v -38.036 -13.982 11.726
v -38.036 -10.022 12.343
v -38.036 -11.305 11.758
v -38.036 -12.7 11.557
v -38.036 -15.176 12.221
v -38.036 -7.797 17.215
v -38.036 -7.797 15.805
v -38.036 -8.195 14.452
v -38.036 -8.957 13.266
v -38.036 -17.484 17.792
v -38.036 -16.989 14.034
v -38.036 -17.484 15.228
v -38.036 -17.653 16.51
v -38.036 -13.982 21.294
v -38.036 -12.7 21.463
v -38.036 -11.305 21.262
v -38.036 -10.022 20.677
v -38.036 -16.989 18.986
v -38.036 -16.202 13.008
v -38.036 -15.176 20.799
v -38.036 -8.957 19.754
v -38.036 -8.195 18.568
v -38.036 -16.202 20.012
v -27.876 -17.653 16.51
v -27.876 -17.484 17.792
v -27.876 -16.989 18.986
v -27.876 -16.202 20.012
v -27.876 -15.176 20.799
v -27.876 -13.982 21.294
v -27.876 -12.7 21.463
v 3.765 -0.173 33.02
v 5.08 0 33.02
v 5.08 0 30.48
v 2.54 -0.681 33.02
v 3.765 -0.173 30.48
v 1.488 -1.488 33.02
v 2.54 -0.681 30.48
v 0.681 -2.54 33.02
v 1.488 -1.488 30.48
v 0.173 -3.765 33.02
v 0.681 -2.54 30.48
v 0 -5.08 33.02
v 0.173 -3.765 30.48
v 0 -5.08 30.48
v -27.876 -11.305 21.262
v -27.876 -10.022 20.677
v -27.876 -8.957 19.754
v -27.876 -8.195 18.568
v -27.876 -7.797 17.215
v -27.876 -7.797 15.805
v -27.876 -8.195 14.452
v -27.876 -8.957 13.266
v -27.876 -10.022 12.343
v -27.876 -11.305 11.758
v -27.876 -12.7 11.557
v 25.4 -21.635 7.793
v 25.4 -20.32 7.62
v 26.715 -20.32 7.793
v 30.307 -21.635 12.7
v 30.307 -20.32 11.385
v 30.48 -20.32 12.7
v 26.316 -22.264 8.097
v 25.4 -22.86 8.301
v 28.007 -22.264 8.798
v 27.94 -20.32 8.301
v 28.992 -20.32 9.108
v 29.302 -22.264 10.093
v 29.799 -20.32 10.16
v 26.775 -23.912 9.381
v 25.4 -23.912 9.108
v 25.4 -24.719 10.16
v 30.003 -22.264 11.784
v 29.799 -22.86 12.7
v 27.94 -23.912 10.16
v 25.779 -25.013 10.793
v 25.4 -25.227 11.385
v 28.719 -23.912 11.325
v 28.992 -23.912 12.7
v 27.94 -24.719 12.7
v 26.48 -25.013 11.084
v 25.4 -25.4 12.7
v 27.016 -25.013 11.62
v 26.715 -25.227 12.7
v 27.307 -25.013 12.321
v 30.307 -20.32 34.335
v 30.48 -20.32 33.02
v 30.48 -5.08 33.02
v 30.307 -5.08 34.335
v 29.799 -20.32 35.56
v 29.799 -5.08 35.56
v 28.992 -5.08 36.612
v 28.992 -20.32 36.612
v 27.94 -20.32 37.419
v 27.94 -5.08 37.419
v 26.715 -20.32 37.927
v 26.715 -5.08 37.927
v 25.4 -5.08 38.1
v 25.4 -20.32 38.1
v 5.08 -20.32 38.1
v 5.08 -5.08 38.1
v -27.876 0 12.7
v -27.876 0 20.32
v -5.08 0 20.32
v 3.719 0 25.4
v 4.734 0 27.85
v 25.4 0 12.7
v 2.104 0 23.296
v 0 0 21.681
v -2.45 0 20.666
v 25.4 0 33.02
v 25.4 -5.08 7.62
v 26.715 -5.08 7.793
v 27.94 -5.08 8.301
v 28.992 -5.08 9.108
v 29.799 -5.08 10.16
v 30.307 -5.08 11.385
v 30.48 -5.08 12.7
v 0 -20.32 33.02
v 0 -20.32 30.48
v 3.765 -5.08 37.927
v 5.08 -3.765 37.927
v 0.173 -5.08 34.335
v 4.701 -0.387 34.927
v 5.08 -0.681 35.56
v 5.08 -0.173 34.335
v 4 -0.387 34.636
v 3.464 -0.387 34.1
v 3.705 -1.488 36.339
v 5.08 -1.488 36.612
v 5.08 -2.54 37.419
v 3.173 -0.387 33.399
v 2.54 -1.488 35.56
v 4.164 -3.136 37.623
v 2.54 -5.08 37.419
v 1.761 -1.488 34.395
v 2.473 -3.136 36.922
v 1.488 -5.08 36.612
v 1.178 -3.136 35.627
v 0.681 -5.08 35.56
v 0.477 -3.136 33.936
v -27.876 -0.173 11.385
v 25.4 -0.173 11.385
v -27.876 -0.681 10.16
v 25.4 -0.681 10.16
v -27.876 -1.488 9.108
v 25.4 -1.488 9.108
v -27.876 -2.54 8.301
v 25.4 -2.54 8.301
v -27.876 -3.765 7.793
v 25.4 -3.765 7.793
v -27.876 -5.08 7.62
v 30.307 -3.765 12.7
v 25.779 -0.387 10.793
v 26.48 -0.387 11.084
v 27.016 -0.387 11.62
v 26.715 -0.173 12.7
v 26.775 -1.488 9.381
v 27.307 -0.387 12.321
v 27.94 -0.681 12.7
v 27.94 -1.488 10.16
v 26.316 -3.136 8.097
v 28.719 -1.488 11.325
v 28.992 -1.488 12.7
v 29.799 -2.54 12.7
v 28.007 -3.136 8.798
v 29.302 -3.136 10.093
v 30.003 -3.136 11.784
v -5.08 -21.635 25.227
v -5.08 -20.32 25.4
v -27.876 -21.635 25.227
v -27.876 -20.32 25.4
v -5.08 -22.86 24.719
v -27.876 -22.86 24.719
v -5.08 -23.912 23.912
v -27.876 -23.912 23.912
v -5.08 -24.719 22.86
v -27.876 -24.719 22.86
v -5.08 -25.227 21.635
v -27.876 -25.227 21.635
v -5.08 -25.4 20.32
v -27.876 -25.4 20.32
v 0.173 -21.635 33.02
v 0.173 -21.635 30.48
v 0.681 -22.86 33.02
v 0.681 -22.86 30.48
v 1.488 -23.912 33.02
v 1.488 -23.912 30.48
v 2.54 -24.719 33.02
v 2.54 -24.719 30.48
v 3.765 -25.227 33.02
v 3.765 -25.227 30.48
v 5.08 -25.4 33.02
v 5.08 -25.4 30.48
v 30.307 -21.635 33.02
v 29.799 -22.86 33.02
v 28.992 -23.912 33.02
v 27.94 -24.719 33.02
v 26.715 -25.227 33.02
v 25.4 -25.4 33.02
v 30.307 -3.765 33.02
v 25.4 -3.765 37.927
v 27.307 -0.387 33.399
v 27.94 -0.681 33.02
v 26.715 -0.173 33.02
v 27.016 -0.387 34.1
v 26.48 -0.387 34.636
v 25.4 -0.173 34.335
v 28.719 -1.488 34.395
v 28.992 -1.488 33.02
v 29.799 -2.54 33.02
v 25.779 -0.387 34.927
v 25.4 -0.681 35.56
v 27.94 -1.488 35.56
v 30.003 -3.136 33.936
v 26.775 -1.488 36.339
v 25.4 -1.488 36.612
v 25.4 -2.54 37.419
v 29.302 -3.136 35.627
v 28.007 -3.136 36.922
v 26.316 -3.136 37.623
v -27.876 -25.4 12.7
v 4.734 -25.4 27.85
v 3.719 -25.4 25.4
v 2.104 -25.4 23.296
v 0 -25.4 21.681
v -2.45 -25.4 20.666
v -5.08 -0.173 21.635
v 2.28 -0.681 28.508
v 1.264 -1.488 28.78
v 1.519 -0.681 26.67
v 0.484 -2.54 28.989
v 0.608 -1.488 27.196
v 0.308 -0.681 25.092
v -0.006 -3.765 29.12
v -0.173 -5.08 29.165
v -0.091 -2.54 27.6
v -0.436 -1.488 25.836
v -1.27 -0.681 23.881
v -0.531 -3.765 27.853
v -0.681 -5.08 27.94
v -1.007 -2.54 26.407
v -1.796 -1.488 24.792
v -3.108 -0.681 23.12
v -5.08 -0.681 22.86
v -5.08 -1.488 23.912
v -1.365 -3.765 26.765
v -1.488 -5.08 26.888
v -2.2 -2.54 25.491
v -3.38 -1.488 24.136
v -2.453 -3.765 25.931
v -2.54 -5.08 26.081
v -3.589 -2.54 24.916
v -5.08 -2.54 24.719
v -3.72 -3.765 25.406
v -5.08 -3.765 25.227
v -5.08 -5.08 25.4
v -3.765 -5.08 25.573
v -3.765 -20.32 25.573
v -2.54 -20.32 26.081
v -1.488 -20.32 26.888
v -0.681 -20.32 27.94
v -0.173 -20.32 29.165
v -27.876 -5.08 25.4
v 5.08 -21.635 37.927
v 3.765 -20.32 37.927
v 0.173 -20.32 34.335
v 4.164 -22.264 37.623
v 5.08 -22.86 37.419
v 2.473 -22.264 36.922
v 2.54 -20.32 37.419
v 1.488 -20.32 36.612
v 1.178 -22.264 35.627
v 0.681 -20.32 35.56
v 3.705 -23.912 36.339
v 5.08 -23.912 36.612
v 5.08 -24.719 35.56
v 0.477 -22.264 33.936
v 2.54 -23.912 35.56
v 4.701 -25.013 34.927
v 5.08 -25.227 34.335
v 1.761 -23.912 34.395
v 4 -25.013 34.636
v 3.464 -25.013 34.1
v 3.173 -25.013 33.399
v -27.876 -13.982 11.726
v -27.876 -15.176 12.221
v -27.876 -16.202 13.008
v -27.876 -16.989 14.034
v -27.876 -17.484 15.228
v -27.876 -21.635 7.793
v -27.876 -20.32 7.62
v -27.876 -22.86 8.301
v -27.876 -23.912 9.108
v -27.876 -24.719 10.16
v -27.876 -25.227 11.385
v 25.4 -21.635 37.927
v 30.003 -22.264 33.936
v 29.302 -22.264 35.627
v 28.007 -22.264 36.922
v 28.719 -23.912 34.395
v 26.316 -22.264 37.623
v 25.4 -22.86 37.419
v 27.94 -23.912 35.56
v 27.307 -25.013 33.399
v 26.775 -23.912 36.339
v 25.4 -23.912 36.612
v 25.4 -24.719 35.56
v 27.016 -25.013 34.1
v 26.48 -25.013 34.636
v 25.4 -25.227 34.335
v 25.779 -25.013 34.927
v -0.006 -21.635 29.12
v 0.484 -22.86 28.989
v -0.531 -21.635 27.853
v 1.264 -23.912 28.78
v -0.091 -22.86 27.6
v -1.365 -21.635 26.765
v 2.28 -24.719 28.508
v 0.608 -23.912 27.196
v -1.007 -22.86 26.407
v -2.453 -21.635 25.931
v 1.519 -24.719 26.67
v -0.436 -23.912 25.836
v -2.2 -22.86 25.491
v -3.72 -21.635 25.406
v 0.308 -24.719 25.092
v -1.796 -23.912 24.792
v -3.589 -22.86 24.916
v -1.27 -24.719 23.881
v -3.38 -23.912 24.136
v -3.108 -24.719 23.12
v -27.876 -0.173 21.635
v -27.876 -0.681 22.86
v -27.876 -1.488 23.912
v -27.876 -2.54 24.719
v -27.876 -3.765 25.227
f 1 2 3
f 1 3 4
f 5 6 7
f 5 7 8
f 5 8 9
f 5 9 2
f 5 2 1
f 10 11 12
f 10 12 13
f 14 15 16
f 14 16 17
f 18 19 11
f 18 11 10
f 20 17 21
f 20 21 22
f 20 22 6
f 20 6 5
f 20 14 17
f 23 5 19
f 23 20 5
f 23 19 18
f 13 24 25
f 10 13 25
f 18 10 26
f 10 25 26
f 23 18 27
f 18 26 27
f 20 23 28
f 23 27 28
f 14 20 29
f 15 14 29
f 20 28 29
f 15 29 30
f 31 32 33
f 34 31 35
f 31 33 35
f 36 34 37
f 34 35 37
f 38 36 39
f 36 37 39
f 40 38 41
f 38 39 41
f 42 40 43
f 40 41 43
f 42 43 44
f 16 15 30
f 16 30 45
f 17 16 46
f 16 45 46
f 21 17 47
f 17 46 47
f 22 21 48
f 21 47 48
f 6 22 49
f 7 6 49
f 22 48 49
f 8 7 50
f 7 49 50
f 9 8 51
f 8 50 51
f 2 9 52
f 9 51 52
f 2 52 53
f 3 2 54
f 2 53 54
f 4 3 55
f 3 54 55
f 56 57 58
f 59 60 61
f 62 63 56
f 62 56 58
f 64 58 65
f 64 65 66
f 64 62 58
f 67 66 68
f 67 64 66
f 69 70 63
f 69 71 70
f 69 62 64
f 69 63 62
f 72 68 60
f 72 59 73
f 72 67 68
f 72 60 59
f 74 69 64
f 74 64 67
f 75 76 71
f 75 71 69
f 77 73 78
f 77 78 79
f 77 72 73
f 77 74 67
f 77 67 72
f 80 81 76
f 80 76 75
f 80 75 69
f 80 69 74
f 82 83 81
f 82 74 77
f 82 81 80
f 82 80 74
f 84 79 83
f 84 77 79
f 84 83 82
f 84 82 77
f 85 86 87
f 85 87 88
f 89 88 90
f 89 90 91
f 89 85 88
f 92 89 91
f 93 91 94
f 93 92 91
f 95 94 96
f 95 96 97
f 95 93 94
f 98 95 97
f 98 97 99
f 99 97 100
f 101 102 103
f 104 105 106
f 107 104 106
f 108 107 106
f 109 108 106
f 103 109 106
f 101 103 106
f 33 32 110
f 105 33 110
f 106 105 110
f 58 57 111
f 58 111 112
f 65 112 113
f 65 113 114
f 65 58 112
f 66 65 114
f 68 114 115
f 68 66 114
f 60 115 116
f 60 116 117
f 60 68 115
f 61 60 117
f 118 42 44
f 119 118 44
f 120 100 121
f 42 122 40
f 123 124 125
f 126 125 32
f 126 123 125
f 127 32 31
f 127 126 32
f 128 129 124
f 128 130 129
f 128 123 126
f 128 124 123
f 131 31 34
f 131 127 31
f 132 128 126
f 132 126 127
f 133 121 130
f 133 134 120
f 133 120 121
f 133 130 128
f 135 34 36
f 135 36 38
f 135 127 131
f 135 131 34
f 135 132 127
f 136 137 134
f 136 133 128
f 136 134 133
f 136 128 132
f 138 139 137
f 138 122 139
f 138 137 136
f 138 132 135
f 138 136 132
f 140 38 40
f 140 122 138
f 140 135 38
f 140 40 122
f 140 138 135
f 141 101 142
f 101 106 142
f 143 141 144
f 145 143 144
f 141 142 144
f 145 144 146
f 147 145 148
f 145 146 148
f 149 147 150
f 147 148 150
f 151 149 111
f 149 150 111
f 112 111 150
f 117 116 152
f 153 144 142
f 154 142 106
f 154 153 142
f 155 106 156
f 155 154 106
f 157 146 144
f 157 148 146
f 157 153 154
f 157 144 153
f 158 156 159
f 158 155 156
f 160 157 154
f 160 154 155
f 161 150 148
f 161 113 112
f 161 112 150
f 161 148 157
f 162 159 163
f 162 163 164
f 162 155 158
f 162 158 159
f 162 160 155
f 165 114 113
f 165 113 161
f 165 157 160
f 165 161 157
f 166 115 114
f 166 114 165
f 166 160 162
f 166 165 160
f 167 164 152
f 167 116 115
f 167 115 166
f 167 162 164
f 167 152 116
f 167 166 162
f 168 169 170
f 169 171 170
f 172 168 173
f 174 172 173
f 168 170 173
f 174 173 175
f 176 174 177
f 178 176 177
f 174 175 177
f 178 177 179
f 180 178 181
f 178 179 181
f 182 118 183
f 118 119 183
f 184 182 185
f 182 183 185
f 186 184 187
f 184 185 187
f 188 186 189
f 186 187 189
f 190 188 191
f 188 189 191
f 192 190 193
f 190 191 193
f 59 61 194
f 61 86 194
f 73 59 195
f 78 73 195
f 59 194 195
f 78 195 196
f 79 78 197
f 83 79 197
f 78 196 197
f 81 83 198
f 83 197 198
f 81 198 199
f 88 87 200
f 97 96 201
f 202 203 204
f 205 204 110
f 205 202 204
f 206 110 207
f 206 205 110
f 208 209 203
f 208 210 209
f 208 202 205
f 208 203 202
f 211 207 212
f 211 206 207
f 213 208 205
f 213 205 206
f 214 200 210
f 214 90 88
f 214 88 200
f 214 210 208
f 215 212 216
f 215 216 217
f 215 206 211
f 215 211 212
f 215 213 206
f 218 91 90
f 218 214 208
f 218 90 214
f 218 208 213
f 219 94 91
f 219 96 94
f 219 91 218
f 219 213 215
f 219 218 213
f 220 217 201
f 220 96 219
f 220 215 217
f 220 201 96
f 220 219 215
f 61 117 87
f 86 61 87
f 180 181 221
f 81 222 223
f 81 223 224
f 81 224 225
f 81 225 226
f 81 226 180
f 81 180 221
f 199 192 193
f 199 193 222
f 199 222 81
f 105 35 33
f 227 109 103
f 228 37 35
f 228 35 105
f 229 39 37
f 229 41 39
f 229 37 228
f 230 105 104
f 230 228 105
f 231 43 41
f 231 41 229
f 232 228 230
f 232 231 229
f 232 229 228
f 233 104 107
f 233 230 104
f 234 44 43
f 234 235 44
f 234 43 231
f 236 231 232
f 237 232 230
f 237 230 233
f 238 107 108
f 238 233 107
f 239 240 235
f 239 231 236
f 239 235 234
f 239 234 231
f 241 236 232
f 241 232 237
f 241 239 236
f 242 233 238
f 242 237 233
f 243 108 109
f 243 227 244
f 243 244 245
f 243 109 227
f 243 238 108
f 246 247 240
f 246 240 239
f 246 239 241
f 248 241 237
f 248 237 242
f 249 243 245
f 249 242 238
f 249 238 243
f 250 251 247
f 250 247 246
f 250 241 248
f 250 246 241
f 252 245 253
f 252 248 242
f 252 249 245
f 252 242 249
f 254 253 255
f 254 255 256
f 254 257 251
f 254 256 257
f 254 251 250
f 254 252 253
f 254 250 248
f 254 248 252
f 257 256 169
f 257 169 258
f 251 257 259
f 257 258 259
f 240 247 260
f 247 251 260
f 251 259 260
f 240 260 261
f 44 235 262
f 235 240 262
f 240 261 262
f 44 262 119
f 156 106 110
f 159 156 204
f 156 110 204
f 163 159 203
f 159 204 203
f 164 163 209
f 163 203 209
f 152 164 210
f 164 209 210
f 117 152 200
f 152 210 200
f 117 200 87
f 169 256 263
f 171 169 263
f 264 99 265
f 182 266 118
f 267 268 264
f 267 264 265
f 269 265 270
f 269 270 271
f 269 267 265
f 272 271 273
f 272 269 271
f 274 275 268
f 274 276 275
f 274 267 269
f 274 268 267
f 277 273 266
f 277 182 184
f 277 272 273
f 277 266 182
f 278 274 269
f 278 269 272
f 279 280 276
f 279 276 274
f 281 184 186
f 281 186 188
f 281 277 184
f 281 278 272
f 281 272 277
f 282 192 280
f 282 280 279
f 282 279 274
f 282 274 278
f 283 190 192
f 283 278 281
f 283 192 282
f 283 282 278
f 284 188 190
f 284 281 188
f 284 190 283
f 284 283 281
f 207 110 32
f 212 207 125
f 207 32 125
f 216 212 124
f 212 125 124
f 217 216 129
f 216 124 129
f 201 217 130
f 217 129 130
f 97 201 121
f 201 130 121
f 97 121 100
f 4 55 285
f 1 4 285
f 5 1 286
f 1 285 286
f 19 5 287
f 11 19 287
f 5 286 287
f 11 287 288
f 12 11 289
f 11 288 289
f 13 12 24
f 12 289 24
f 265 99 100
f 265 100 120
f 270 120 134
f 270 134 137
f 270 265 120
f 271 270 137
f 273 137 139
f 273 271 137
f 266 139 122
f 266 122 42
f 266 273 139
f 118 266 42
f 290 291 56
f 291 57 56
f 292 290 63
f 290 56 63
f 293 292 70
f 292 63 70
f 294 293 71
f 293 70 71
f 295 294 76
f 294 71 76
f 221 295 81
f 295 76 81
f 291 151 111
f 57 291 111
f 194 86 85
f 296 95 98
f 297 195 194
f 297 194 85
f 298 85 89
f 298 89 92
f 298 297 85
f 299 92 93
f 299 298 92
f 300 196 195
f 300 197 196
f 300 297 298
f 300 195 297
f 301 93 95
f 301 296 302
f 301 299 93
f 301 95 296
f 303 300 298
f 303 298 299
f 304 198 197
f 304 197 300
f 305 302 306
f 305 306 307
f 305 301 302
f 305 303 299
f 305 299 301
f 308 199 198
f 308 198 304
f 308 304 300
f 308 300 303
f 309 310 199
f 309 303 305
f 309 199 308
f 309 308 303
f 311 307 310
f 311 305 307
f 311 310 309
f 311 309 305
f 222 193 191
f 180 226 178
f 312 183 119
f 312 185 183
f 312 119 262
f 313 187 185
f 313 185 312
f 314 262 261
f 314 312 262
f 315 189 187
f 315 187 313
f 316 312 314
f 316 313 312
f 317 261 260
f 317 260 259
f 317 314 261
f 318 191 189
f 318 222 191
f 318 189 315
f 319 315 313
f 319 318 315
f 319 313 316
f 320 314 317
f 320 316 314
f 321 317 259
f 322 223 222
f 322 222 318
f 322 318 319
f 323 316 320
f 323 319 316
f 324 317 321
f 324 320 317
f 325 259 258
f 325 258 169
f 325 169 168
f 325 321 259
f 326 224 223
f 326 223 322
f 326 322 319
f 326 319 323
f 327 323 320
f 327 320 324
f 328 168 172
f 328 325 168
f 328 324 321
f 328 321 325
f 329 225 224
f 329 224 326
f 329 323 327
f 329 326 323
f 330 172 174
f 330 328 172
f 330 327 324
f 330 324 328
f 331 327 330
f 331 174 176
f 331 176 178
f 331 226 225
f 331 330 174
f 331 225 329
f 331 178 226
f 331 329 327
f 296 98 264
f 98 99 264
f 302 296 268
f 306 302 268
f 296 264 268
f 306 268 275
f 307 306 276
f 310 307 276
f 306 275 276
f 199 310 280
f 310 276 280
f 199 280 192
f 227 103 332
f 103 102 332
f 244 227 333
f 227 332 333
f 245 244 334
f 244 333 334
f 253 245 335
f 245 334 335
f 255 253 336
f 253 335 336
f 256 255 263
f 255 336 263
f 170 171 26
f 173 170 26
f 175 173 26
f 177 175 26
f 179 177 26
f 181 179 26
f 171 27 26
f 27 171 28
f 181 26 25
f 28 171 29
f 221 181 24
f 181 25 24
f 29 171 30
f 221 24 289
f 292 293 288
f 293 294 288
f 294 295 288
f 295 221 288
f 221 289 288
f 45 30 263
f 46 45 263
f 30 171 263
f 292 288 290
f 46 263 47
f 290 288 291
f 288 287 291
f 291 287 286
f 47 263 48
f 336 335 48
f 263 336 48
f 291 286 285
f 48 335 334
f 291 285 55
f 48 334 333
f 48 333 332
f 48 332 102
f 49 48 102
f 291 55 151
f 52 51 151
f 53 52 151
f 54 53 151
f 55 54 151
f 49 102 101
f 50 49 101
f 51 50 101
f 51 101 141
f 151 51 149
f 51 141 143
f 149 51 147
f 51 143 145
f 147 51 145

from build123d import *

# Parameters (mm, degrees)
F1_DEPTH = 25.4
F2_R     = 5.08
F3_R     = 5.08
F5_DEPTH = 10.16


with BuildPart() as f1:
    # F0 (on Front) → F1 (new body)
    with BuildSketch(Plane.XZ):
        Polygon((0, 38.0835495889), (0, 25.4), (-25.4, 25.4), (-27.8758880853, 25.4), (-27.8758880853, 7.62), (30.48, 7.62), (30.48, 38.1), (0, 38.1), align=None)
    extrude(amount=F1_DEPTH)

    # F2
    f2_edges = [f1.edges().sort_by_distance(p)[0] for p in [
        (0, -12.7, 25.4),
        (0, -12.7, 38.1),
        (30.48, -12.7, 38.1),
        (30.48, -12.7, 7.62),
    ]]
    fillet(f2_edges, radius=F2_R)

    # F3
    f3_edges = [f1.edges().sort_by_distance(p)[0] for p in [
        (30.48, 0, 22.86),
        (-16.477944, -25.4, 25.4),
    ]]
    fillet(f3_edges, radius=F3_R)

    # F4 (on face) → F5 (join)
    with BuildSketch(Plane(origin=(-27.8758880853, 0, 0), x_dir=(0, -1, 0), z_dir=(-1, 0, 0))):
        with BuildLine():
            Line((12.7, 11.557), (12.7, 21.463))
            ThreePointArc((12.7, 21.463), (7.747, 16.51), (12.7, 11.557))
        make_face()
        with BuildLine():
            ThreePointArc((17.653, 16.51), (16.2022998872, 20.0122998872), (12.7, 21.463))
            Line((12.7, 21.463), (12.7, 11.557))
            ThreePointArc((12.7, 11.557), (16.2022998872, 13.0077001128), (17.653, 16.51))
        make_face()
    extrude(amount=F5_DEPTH)


solid = f1.part
